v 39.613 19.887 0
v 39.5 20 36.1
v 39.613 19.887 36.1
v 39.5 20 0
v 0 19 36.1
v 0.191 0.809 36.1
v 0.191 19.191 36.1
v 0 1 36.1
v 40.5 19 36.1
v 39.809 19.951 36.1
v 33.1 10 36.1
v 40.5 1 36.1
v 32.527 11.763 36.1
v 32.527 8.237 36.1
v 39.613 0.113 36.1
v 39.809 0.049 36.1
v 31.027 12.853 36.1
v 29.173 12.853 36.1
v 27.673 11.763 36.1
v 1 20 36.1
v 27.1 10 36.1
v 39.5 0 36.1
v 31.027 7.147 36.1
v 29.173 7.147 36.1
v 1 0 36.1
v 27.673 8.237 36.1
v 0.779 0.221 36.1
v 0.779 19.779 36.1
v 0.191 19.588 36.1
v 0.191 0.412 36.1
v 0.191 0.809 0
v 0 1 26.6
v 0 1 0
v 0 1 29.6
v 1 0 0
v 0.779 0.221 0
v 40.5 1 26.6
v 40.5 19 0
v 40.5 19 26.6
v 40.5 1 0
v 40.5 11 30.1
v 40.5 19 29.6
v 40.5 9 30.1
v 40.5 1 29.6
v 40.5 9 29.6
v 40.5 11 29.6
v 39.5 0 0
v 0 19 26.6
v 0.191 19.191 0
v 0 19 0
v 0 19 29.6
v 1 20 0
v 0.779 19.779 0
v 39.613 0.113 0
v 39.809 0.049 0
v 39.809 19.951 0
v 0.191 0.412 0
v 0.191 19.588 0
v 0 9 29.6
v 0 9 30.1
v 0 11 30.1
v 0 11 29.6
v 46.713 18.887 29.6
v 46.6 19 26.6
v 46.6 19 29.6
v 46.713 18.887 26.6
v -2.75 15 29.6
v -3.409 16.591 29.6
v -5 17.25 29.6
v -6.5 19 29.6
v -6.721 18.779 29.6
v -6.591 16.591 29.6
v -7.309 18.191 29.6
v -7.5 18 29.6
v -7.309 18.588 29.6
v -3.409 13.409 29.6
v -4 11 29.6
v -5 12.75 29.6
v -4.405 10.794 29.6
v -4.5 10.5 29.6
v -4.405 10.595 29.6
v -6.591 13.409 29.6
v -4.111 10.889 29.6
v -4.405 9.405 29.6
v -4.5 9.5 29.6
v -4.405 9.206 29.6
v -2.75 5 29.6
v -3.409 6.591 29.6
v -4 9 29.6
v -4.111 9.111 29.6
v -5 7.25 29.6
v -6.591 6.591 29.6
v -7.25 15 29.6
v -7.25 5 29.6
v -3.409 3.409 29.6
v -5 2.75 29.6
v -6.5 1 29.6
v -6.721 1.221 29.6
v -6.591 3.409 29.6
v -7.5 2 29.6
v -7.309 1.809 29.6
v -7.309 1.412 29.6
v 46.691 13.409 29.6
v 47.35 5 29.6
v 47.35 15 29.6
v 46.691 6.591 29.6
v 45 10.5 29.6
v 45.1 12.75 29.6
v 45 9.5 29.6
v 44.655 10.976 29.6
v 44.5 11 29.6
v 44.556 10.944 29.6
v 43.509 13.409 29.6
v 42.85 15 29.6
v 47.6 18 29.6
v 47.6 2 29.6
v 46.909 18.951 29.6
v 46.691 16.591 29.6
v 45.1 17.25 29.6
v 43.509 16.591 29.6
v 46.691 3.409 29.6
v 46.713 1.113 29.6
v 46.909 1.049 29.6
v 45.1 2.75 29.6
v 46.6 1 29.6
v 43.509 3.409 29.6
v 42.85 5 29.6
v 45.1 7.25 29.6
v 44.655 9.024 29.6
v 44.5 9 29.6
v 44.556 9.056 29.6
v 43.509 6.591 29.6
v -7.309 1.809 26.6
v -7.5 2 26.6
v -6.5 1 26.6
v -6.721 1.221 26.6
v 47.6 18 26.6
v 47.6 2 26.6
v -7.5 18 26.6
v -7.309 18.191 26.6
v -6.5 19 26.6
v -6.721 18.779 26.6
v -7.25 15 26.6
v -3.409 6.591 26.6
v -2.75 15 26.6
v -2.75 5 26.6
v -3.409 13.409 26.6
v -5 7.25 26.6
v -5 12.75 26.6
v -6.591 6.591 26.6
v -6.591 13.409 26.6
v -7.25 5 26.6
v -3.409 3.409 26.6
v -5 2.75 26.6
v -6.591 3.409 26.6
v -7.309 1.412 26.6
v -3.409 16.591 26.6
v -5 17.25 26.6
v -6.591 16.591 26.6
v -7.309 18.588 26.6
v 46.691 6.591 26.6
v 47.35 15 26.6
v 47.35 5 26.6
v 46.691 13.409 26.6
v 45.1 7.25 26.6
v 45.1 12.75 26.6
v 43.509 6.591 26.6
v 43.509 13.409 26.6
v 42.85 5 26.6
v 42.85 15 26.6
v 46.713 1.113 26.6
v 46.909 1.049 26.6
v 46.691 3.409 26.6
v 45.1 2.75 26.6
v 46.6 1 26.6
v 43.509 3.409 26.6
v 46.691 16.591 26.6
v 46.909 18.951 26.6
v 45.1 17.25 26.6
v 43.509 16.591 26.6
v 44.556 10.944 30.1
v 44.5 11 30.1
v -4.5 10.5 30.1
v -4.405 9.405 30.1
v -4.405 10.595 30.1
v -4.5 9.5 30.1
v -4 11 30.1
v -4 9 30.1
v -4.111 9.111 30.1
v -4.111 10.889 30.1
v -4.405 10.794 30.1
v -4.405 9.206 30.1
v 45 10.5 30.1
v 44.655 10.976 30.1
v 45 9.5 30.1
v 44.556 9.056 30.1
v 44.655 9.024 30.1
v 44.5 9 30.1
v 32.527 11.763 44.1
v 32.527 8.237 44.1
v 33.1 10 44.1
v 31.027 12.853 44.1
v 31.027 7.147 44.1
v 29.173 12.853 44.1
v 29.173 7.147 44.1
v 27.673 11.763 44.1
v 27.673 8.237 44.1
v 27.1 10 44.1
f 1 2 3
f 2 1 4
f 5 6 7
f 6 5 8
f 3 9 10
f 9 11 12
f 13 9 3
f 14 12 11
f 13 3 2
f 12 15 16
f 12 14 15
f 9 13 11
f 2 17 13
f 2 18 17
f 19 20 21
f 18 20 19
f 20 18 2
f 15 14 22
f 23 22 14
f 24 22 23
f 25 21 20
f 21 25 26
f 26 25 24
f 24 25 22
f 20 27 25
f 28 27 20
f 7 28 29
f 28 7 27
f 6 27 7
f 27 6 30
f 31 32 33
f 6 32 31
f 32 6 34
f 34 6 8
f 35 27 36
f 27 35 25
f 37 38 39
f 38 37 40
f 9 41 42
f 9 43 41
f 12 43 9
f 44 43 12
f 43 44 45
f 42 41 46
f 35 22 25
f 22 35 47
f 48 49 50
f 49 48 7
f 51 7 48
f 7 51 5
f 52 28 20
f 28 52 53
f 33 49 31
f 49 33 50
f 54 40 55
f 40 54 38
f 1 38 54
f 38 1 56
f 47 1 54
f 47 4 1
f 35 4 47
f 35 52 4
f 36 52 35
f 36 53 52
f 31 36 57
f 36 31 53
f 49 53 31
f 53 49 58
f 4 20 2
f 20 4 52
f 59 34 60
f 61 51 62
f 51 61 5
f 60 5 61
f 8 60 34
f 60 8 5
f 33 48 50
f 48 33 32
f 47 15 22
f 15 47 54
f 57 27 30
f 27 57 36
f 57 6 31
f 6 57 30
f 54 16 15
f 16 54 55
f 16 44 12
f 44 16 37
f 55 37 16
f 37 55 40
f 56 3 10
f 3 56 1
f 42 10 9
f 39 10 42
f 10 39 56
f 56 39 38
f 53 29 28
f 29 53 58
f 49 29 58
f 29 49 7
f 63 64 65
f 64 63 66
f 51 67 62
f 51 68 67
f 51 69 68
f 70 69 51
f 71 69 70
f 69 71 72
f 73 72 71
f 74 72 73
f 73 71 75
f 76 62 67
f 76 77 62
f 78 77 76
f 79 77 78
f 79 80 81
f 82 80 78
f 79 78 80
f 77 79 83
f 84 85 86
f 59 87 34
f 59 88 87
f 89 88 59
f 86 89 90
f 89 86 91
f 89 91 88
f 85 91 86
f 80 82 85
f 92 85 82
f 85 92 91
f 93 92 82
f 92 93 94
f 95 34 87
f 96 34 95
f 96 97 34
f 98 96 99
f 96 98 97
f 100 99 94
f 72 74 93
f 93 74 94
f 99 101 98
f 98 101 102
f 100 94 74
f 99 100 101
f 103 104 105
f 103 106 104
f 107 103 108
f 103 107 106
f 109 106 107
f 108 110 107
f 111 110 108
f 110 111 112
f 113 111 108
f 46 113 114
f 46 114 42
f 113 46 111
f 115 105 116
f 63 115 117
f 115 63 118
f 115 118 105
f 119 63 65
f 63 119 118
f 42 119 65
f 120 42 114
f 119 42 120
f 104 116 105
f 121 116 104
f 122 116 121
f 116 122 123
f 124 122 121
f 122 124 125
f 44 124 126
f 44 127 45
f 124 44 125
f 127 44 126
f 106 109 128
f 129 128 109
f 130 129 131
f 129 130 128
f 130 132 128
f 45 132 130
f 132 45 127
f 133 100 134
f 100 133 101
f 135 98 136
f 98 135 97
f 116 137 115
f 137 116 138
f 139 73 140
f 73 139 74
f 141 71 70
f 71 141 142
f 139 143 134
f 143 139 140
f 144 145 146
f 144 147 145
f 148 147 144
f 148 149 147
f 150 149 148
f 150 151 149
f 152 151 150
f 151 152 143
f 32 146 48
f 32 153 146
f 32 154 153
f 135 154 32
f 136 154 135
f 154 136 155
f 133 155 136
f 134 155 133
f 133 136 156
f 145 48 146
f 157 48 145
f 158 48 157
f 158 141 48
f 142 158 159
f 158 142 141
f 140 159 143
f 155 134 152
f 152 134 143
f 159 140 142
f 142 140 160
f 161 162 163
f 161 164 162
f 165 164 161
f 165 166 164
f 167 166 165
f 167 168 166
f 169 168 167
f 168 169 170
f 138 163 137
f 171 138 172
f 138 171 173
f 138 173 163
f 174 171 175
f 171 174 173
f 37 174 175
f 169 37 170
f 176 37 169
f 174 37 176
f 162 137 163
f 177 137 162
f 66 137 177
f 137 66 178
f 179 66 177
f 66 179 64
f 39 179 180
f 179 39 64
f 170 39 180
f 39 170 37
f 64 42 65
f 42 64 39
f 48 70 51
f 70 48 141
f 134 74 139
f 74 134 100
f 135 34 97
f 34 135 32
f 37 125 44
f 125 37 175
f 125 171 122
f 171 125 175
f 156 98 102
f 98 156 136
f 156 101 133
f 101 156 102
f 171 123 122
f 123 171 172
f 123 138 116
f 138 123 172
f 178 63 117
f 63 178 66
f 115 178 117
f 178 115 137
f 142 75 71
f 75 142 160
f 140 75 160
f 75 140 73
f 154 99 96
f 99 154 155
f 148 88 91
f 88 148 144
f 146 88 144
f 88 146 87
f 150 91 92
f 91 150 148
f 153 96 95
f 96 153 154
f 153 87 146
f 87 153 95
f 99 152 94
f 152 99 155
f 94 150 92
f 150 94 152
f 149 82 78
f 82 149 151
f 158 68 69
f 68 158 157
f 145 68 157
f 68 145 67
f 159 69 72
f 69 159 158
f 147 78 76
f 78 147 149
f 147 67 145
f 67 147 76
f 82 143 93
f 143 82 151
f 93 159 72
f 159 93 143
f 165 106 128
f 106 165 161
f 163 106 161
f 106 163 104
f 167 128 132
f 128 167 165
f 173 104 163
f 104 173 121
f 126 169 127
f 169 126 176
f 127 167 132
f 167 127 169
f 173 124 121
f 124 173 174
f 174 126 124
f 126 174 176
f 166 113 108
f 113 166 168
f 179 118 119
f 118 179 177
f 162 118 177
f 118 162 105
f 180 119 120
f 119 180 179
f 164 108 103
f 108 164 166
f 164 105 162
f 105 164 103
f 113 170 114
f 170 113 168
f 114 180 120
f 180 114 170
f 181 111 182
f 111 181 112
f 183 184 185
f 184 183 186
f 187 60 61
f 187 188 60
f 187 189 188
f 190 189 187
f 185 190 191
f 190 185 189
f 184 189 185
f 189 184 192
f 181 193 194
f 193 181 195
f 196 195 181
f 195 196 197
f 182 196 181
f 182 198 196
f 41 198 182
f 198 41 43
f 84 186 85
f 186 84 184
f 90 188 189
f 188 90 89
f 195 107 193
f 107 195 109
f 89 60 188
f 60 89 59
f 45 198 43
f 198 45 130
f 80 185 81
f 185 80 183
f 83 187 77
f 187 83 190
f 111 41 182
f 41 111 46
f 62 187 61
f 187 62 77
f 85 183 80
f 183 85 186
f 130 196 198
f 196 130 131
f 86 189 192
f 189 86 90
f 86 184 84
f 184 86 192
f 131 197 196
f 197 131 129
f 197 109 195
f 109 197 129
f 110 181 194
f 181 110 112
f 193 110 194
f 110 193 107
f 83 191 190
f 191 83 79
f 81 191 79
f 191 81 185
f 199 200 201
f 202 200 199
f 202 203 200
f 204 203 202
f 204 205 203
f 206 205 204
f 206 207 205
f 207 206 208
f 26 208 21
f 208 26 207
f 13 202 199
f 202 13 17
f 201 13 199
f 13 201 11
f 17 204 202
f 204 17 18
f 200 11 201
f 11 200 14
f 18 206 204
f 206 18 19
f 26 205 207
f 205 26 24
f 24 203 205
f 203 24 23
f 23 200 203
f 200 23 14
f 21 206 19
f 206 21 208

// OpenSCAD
// file: plate.scad
/*
  Simple method of rounding off corners. If the radius is zero or the radius more than half the width or height, a cube will be rendered instead.
*/

module plate(v, r=0) {
  if (r <= 0 || r > v[0] / 2 || r > v[1] / 2) {
    cube(v);
  }
  else {
    union() {
      linear_extrude(v[2])
        polygon(
          [
            [r, 0],
            [v[0]-r, 0],
            [v[0], r],
            [v[0], v[1]-r],
            [v[0]-r, v[1]],
            [r, v[1]],
            [0, v[1]-r],
            [0, r]
          ],
          [[0,1,2,3,4,5,6,7]]
        );
      translate([r, r, 0]) cylinder(r=r, h=v[2]);
      translate([v[0]-r, r, 0]) cylinder(r=r, h=v[2]);
      translate([v[0]-r, v[1]-r, 0]) cylinder(r=r, h=v[2]);
      translate([r, v[1]-r, 0]) cylinder(r=r, h=v[2]);
    }
  }
}

/*
// Quick rendering example. Corner is just beveled.
plate([20, 40, 2], r=2, $fn=4);

// Nicer looking corner but takes longer to render.
translate([-10, 0, 10]) rotate([0, 90, 0]) plate([10, 10, 3], r=3, $fn=24); 
*/
// main file
include <plate.scad>

module servoS9001() {
  shaftX = 40.5 - 10.4;
  shaftY = 10;
  plateDepth = 36.1 - 44.1;
  plateThickness = 29.1-26.1;
  screwInsetX = (55.5 - 50.5) / 2;
  
    union() {
      // Body
      plate([40.5,20,36.1], r=1); 
      // Screw Plate
      translate([-7.5,1,26.6]) {
        difference() {
          plate([55.1,18,plateThickness], r=1); 
          // Screw holes
          translate([screwInsetX, 4, 0]) cylinder(r=2.25, h=plateThickness);
          translate([screwInsetX, 14, 0]) cylinder(r=2.25, h=plateThickness);
          translate([55.1 - screwInsetX, 4, 0]) cylinder(r=2.25, h=plateThickness);
          translate([55.1 - screwInsetX, 14, 0]) cylinder(r=2.25, h=plateThickness);
        }
      }
      // Tabs on the screw plate
      translate([-4.5,9,29.1]) plate([49.5,2,1], r=0.5); 
      // Shaft
      translate([shaftX, shaftY, 36.1]) cylinder(r=3, h=8);
    }
}

servoS9001();
